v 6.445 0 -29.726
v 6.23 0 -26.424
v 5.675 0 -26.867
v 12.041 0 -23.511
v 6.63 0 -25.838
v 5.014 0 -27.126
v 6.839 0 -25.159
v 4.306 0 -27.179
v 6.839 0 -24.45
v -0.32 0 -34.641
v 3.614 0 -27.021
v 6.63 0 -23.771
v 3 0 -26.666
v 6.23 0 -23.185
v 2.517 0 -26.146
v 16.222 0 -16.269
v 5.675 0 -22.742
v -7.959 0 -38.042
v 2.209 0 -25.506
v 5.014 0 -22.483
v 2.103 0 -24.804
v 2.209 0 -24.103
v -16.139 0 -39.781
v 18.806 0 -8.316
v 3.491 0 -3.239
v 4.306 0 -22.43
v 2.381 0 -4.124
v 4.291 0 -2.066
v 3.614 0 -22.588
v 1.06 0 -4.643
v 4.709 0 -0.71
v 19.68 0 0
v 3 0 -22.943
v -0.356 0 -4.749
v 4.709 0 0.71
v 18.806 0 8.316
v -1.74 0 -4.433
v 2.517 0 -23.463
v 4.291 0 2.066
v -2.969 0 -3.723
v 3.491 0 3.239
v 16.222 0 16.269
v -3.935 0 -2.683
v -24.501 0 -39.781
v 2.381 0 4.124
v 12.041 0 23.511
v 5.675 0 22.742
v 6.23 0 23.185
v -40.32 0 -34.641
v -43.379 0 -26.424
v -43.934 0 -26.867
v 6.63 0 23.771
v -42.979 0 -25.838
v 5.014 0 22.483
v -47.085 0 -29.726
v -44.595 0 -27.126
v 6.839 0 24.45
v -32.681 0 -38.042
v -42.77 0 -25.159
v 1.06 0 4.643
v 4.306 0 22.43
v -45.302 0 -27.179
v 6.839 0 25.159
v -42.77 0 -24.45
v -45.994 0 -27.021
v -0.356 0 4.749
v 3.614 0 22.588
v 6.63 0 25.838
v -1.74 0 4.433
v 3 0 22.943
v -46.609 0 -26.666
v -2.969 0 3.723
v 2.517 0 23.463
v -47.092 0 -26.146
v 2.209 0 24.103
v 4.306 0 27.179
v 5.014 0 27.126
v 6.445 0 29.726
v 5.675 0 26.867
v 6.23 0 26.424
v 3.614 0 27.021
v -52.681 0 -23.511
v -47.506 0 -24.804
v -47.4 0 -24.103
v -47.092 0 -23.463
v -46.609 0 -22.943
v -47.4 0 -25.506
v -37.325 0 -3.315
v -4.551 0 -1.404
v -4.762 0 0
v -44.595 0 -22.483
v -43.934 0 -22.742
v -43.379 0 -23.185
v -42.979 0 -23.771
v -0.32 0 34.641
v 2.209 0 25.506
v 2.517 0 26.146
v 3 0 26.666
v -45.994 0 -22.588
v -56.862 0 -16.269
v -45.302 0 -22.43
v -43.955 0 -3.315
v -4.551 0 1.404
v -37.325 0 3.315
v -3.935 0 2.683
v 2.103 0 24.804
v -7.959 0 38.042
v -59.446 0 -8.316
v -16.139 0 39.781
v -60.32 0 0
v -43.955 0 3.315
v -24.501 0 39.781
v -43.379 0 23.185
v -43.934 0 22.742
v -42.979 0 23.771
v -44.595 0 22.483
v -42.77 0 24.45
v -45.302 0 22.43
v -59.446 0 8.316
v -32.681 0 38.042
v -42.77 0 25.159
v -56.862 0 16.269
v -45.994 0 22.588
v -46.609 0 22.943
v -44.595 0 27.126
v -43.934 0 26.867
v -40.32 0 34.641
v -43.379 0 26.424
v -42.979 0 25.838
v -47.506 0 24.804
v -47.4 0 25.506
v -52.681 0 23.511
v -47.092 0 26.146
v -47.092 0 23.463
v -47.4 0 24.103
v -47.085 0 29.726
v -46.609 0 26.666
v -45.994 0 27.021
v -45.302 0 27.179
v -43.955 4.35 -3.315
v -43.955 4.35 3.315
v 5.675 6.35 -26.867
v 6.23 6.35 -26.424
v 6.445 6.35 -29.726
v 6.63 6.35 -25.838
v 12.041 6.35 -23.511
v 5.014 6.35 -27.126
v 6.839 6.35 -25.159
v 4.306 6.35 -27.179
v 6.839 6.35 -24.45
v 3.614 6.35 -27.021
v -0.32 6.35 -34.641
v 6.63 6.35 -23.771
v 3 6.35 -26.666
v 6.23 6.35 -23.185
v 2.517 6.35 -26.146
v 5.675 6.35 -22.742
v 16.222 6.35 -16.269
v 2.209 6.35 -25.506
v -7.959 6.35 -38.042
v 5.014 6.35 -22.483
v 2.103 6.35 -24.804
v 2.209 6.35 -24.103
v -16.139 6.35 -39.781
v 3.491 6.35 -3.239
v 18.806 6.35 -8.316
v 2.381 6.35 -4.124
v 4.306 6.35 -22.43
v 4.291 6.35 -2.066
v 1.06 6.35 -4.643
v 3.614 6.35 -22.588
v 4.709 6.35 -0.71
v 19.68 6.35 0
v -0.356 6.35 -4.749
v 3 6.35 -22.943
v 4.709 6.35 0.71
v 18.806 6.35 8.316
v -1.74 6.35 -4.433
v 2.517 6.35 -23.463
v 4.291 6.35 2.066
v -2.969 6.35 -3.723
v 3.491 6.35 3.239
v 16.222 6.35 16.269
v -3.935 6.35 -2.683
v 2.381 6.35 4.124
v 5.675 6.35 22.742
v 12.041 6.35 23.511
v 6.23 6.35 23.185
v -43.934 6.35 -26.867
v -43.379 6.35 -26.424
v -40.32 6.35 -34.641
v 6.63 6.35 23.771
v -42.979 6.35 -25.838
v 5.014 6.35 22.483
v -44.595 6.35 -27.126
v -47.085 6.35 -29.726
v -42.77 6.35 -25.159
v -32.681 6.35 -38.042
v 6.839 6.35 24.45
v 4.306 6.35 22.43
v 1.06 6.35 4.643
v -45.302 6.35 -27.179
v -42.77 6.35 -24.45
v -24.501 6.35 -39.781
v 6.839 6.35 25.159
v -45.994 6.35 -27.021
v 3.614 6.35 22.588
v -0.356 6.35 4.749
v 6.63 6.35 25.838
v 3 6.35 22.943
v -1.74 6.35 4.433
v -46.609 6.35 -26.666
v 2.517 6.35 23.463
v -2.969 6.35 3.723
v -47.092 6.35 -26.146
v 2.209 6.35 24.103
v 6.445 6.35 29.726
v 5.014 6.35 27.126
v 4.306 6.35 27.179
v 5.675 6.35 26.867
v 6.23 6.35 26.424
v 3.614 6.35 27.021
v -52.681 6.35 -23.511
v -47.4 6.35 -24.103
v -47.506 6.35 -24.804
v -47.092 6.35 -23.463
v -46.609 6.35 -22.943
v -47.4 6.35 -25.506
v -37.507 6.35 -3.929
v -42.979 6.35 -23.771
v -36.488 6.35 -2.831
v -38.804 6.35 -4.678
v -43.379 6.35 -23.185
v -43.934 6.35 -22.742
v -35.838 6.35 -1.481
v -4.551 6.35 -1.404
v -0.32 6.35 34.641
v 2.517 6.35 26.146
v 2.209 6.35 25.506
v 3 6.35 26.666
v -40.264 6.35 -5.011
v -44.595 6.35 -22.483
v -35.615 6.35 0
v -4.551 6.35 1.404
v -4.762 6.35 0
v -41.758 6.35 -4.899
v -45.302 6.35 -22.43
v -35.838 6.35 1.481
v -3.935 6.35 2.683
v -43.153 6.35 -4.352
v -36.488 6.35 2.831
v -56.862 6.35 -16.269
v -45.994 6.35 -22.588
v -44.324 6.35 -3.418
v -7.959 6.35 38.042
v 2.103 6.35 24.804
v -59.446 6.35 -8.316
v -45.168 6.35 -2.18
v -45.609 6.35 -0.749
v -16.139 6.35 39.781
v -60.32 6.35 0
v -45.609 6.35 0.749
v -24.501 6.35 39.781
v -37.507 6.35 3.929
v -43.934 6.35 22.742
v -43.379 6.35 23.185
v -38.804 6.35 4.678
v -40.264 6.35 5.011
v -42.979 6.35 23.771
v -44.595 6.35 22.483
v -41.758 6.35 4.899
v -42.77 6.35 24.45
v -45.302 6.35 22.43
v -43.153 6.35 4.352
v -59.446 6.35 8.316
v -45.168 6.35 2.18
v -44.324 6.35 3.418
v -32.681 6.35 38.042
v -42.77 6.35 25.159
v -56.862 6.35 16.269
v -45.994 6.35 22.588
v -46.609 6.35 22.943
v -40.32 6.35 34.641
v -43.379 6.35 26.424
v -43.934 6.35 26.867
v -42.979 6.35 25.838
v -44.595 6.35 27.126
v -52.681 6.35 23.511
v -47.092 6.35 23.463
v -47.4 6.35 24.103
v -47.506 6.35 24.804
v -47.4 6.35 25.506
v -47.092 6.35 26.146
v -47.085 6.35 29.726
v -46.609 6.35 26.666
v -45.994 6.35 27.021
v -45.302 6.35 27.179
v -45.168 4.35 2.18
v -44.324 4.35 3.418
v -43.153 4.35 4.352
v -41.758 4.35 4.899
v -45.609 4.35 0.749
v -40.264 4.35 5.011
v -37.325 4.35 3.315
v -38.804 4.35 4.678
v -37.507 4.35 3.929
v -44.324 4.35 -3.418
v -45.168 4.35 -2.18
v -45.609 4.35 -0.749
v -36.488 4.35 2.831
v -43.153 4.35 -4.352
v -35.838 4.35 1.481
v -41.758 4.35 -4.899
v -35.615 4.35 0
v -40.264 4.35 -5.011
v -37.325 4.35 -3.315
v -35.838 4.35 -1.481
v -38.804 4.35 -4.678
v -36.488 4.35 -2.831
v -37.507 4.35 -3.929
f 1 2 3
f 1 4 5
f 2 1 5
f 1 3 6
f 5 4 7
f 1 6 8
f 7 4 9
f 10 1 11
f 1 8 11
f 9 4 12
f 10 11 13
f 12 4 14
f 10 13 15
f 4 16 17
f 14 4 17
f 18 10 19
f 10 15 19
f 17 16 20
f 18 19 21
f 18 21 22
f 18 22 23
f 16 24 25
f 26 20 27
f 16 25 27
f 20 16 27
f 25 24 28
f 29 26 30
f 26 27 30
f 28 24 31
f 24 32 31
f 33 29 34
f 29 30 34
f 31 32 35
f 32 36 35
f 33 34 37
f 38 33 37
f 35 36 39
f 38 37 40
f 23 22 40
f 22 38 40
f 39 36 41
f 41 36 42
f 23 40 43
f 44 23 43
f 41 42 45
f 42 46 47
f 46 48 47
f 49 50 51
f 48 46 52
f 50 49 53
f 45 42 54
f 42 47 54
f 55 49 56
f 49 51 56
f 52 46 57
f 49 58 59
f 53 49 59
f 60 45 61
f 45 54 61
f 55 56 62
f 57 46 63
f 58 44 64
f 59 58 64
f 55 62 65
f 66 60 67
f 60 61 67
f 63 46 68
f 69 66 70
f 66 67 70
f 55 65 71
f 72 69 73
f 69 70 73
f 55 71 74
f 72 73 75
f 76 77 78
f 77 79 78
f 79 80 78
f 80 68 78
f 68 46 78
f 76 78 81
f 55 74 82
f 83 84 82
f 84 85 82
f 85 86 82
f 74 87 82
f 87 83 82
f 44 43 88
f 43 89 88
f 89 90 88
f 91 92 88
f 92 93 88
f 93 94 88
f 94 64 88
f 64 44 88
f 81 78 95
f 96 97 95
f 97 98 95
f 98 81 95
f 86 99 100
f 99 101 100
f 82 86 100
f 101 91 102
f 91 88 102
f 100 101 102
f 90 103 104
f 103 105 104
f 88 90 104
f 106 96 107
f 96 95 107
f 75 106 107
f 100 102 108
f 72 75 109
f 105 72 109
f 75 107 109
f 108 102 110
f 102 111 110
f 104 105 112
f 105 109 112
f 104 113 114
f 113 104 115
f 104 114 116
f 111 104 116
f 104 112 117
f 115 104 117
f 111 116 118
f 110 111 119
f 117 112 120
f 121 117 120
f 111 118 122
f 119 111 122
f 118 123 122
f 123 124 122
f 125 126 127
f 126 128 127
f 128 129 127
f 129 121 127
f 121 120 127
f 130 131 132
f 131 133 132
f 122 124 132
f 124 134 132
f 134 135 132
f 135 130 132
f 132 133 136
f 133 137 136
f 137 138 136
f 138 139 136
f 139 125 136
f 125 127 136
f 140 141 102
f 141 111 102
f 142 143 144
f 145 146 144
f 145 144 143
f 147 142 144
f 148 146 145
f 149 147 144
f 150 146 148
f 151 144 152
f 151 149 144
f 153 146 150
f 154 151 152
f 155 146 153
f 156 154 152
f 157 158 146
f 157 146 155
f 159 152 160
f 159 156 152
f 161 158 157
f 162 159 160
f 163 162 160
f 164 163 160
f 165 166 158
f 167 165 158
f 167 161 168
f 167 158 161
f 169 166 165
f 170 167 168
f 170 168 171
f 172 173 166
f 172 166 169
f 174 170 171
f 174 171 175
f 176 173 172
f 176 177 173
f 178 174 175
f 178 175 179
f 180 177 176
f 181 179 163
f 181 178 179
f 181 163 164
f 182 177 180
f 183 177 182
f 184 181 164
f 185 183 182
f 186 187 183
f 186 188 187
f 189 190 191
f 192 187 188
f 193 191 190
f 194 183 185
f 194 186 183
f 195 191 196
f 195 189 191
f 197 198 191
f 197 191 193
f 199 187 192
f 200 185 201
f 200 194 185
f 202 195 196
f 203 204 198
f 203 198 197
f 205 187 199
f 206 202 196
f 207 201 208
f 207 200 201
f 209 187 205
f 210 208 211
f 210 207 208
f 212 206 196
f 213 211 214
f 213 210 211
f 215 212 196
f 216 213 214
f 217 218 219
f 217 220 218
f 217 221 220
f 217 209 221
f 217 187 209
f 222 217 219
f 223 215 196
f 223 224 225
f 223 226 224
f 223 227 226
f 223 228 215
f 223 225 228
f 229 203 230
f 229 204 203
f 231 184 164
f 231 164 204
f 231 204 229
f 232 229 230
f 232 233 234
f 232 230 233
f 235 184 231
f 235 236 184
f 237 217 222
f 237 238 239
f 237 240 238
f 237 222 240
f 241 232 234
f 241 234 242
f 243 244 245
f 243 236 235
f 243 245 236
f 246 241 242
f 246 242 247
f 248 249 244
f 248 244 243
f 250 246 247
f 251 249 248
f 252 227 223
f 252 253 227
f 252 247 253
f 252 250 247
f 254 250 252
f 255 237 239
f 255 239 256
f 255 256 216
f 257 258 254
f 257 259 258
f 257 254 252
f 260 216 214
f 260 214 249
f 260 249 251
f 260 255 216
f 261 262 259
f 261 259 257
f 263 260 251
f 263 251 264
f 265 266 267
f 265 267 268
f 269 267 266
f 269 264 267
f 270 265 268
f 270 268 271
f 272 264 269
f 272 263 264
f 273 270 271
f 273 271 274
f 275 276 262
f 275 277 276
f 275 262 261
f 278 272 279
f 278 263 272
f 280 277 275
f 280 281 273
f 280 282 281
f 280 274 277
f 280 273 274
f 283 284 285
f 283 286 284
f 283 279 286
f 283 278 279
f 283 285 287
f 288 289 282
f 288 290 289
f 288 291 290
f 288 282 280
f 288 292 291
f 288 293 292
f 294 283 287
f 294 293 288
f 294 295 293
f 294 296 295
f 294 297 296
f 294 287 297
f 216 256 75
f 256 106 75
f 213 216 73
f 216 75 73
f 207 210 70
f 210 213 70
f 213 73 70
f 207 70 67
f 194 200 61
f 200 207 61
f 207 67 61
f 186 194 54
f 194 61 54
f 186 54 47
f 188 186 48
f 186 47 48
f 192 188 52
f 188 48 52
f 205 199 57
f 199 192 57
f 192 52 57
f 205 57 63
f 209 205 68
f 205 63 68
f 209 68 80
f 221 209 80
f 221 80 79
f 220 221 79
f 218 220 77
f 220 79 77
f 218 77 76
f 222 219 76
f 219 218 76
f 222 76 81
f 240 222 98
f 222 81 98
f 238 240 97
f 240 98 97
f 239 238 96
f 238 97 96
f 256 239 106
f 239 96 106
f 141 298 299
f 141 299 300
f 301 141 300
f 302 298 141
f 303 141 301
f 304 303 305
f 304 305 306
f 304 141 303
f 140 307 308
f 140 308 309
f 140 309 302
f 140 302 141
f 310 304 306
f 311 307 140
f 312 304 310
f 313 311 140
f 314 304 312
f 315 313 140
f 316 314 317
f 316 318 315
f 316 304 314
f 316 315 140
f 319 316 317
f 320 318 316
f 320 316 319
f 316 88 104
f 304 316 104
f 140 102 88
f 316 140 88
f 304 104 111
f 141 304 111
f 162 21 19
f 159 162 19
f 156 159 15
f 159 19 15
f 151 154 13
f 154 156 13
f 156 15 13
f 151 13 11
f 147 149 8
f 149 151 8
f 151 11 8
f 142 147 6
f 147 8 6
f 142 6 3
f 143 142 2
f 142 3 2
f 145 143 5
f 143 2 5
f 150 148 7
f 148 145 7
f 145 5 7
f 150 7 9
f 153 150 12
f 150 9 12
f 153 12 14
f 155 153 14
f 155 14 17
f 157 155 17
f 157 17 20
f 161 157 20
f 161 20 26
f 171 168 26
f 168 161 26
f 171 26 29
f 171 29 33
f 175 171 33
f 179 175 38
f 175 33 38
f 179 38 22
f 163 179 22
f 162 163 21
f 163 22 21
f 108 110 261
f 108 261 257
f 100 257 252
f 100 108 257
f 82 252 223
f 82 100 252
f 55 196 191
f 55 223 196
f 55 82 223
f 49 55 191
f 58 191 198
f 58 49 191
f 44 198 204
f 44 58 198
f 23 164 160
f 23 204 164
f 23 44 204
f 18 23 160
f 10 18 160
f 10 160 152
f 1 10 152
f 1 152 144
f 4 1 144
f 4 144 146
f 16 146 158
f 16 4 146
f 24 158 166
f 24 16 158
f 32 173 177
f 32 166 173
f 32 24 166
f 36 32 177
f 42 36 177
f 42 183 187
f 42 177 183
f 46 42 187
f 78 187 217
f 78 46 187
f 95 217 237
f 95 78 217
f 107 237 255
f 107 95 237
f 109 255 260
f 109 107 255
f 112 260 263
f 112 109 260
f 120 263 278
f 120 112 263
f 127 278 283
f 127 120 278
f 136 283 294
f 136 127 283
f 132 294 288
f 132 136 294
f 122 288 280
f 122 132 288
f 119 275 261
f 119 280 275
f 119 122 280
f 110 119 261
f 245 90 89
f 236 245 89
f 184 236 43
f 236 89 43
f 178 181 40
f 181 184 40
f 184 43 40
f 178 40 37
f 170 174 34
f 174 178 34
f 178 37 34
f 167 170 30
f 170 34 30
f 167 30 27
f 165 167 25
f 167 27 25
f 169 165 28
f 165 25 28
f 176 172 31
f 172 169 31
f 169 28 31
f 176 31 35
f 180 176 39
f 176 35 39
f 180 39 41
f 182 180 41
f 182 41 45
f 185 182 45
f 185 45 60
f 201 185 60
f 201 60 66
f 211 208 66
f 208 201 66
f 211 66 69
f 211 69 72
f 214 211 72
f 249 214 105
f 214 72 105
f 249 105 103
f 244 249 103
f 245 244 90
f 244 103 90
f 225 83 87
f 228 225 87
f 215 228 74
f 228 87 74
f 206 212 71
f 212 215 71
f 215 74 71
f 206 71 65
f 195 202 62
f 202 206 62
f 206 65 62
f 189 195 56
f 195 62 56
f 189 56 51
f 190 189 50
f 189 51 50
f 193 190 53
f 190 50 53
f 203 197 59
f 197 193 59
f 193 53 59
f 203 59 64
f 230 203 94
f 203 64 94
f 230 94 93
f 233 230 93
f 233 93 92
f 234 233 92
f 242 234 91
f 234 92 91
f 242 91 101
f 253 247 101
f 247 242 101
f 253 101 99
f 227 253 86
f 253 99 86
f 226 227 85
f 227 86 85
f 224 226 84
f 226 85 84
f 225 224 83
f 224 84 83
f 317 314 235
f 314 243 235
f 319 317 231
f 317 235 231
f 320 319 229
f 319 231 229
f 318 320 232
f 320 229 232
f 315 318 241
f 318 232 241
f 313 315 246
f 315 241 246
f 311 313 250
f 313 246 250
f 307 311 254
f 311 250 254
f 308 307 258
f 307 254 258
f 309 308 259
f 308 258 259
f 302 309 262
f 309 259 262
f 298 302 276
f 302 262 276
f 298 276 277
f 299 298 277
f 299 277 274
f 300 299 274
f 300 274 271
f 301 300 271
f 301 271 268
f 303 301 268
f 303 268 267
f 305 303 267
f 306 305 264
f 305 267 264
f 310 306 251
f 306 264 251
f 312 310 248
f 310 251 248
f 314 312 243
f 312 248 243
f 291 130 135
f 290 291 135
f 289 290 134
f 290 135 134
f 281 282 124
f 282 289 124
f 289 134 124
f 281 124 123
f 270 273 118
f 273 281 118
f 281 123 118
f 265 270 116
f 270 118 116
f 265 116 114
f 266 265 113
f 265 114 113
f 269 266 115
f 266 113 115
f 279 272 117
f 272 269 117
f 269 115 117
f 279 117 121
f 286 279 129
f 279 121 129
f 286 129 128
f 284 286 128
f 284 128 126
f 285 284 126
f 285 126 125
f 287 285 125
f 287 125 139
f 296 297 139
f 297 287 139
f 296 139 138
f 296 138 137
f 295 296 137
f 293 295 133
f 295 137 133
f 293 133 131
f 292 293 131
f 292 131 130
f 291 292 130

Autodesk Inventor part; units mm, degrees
ref_plane "YZ Plane" through (0, 0, 0) normal (1, 0, 0) x (0, 1, 0)
ref_plane "XZ Plane" through (0, 0, 0) normal (0, 1, 0) x (-1, 0, 0)
ref_plane "XY Plane" through (0, 0, 0) normal (0, 0, 1) x (1, 0, 0)
sketch "Sketch1" plane through (0, 0, 0) normal (0, 1, 0) x (-1, 0, 0)
  point P0 (0, 0)
sketch "Sketch2" plane through (0, 0, 0) normal (0, 1, 0) x (-1, 0, 0)
  circle A0 centre (0, 0) radius 4.7625
  circle A1 centre (20.32, 0) radius 40
  line L0 (20.32, -34.925) -> (20.32, 34.925) construction
  line L1 (29.845, -25.4) -> (29.845, 25.4) construction
  line L2 (10.795, 25.4) -> (10.795, -25.4) construction
  arc A2 (10.795, -25.4) -> (29.845, -25.4) centre (20.32, -25.4) ccw construction
  arc A3 (29.845, 25.4) -> (10.795, 25.4) centre (20.32, 25.4) ccw construction
  line L3 (-19.68, 0) -> (60.32, 0) construction
  circle A4 centre (0, 0) radius 20.32 construction
  circle A5 centre (40.64, 0) radius 20.32 construction
  circle A6 centre (20.32, 0) radius 40.64 construction
  line L4 (20.32, 0) -> (48.6043, -28.2843) construction
  line L5 (20.32, 0) -> (60.32, 0) construction
  circle A7 centre (45.1244, -24.8044) radius 2.3812
  circle A8 centre (45.1244, -24.8044) radius 4.9212 construction
  circle A9 centre (45.1244, 24.8044) radius 2.3812
  circle A10 centre (-4.4844, 24.8044) radius 2.3812
  circle A11 centre (-4.4844, -24.8044) radius 2.3812
  line L6 (43.9547, -3.3147) -> (37.3253, -3.3147)
  line L7 (37.3253, -3.3147) -> (37.3253, 3.3147)
  line L8 (37.3253, 3.3147) -> (43.9547, 3.3147)
  line L9 (43.9547, 3.3147) -> (43.9547, -3.3147)
  line L10 (43.9547, -3.3147) -> (37.3253, 3.3147) construction
  line L11 (37.3253, -3.3147) -> (43.9547, 3.3147) construction
  circle A12 centre (40.64, 0) radius 5.0254
  dimension "d5" = 40.64
  dimension "d0" = 9.525
  dimension "d1" = 80
  dimension "d2" = 19.05
  dimension "d3" = 69.85
  dimension "d6" = 81.28
  dimension "d7" = 45
  dimension "d8" = 4.7625
  dimension "d9" = 2.54
  dimension "d12" = 360
  dimension "d16" = 6.6294
  dimension "d18" = 10.0508
extrude "Extrusion1" add sketch "Sketch2" along normal blind 6.35 contours A1 | A12
sketch "Sketch3" plane through (-20.32, 6.35, 0) normal (0, 1, 0) x (1, 0, 0)
  circle A0 centre (-20.32, 0) radius 5.0254
  point P0 (20.32, 0)
  dimension "d19" = 10.0508
extrude "Extrusion2" cut sketch "Sketch3" against normal blind 2
properties part number "carriage"
